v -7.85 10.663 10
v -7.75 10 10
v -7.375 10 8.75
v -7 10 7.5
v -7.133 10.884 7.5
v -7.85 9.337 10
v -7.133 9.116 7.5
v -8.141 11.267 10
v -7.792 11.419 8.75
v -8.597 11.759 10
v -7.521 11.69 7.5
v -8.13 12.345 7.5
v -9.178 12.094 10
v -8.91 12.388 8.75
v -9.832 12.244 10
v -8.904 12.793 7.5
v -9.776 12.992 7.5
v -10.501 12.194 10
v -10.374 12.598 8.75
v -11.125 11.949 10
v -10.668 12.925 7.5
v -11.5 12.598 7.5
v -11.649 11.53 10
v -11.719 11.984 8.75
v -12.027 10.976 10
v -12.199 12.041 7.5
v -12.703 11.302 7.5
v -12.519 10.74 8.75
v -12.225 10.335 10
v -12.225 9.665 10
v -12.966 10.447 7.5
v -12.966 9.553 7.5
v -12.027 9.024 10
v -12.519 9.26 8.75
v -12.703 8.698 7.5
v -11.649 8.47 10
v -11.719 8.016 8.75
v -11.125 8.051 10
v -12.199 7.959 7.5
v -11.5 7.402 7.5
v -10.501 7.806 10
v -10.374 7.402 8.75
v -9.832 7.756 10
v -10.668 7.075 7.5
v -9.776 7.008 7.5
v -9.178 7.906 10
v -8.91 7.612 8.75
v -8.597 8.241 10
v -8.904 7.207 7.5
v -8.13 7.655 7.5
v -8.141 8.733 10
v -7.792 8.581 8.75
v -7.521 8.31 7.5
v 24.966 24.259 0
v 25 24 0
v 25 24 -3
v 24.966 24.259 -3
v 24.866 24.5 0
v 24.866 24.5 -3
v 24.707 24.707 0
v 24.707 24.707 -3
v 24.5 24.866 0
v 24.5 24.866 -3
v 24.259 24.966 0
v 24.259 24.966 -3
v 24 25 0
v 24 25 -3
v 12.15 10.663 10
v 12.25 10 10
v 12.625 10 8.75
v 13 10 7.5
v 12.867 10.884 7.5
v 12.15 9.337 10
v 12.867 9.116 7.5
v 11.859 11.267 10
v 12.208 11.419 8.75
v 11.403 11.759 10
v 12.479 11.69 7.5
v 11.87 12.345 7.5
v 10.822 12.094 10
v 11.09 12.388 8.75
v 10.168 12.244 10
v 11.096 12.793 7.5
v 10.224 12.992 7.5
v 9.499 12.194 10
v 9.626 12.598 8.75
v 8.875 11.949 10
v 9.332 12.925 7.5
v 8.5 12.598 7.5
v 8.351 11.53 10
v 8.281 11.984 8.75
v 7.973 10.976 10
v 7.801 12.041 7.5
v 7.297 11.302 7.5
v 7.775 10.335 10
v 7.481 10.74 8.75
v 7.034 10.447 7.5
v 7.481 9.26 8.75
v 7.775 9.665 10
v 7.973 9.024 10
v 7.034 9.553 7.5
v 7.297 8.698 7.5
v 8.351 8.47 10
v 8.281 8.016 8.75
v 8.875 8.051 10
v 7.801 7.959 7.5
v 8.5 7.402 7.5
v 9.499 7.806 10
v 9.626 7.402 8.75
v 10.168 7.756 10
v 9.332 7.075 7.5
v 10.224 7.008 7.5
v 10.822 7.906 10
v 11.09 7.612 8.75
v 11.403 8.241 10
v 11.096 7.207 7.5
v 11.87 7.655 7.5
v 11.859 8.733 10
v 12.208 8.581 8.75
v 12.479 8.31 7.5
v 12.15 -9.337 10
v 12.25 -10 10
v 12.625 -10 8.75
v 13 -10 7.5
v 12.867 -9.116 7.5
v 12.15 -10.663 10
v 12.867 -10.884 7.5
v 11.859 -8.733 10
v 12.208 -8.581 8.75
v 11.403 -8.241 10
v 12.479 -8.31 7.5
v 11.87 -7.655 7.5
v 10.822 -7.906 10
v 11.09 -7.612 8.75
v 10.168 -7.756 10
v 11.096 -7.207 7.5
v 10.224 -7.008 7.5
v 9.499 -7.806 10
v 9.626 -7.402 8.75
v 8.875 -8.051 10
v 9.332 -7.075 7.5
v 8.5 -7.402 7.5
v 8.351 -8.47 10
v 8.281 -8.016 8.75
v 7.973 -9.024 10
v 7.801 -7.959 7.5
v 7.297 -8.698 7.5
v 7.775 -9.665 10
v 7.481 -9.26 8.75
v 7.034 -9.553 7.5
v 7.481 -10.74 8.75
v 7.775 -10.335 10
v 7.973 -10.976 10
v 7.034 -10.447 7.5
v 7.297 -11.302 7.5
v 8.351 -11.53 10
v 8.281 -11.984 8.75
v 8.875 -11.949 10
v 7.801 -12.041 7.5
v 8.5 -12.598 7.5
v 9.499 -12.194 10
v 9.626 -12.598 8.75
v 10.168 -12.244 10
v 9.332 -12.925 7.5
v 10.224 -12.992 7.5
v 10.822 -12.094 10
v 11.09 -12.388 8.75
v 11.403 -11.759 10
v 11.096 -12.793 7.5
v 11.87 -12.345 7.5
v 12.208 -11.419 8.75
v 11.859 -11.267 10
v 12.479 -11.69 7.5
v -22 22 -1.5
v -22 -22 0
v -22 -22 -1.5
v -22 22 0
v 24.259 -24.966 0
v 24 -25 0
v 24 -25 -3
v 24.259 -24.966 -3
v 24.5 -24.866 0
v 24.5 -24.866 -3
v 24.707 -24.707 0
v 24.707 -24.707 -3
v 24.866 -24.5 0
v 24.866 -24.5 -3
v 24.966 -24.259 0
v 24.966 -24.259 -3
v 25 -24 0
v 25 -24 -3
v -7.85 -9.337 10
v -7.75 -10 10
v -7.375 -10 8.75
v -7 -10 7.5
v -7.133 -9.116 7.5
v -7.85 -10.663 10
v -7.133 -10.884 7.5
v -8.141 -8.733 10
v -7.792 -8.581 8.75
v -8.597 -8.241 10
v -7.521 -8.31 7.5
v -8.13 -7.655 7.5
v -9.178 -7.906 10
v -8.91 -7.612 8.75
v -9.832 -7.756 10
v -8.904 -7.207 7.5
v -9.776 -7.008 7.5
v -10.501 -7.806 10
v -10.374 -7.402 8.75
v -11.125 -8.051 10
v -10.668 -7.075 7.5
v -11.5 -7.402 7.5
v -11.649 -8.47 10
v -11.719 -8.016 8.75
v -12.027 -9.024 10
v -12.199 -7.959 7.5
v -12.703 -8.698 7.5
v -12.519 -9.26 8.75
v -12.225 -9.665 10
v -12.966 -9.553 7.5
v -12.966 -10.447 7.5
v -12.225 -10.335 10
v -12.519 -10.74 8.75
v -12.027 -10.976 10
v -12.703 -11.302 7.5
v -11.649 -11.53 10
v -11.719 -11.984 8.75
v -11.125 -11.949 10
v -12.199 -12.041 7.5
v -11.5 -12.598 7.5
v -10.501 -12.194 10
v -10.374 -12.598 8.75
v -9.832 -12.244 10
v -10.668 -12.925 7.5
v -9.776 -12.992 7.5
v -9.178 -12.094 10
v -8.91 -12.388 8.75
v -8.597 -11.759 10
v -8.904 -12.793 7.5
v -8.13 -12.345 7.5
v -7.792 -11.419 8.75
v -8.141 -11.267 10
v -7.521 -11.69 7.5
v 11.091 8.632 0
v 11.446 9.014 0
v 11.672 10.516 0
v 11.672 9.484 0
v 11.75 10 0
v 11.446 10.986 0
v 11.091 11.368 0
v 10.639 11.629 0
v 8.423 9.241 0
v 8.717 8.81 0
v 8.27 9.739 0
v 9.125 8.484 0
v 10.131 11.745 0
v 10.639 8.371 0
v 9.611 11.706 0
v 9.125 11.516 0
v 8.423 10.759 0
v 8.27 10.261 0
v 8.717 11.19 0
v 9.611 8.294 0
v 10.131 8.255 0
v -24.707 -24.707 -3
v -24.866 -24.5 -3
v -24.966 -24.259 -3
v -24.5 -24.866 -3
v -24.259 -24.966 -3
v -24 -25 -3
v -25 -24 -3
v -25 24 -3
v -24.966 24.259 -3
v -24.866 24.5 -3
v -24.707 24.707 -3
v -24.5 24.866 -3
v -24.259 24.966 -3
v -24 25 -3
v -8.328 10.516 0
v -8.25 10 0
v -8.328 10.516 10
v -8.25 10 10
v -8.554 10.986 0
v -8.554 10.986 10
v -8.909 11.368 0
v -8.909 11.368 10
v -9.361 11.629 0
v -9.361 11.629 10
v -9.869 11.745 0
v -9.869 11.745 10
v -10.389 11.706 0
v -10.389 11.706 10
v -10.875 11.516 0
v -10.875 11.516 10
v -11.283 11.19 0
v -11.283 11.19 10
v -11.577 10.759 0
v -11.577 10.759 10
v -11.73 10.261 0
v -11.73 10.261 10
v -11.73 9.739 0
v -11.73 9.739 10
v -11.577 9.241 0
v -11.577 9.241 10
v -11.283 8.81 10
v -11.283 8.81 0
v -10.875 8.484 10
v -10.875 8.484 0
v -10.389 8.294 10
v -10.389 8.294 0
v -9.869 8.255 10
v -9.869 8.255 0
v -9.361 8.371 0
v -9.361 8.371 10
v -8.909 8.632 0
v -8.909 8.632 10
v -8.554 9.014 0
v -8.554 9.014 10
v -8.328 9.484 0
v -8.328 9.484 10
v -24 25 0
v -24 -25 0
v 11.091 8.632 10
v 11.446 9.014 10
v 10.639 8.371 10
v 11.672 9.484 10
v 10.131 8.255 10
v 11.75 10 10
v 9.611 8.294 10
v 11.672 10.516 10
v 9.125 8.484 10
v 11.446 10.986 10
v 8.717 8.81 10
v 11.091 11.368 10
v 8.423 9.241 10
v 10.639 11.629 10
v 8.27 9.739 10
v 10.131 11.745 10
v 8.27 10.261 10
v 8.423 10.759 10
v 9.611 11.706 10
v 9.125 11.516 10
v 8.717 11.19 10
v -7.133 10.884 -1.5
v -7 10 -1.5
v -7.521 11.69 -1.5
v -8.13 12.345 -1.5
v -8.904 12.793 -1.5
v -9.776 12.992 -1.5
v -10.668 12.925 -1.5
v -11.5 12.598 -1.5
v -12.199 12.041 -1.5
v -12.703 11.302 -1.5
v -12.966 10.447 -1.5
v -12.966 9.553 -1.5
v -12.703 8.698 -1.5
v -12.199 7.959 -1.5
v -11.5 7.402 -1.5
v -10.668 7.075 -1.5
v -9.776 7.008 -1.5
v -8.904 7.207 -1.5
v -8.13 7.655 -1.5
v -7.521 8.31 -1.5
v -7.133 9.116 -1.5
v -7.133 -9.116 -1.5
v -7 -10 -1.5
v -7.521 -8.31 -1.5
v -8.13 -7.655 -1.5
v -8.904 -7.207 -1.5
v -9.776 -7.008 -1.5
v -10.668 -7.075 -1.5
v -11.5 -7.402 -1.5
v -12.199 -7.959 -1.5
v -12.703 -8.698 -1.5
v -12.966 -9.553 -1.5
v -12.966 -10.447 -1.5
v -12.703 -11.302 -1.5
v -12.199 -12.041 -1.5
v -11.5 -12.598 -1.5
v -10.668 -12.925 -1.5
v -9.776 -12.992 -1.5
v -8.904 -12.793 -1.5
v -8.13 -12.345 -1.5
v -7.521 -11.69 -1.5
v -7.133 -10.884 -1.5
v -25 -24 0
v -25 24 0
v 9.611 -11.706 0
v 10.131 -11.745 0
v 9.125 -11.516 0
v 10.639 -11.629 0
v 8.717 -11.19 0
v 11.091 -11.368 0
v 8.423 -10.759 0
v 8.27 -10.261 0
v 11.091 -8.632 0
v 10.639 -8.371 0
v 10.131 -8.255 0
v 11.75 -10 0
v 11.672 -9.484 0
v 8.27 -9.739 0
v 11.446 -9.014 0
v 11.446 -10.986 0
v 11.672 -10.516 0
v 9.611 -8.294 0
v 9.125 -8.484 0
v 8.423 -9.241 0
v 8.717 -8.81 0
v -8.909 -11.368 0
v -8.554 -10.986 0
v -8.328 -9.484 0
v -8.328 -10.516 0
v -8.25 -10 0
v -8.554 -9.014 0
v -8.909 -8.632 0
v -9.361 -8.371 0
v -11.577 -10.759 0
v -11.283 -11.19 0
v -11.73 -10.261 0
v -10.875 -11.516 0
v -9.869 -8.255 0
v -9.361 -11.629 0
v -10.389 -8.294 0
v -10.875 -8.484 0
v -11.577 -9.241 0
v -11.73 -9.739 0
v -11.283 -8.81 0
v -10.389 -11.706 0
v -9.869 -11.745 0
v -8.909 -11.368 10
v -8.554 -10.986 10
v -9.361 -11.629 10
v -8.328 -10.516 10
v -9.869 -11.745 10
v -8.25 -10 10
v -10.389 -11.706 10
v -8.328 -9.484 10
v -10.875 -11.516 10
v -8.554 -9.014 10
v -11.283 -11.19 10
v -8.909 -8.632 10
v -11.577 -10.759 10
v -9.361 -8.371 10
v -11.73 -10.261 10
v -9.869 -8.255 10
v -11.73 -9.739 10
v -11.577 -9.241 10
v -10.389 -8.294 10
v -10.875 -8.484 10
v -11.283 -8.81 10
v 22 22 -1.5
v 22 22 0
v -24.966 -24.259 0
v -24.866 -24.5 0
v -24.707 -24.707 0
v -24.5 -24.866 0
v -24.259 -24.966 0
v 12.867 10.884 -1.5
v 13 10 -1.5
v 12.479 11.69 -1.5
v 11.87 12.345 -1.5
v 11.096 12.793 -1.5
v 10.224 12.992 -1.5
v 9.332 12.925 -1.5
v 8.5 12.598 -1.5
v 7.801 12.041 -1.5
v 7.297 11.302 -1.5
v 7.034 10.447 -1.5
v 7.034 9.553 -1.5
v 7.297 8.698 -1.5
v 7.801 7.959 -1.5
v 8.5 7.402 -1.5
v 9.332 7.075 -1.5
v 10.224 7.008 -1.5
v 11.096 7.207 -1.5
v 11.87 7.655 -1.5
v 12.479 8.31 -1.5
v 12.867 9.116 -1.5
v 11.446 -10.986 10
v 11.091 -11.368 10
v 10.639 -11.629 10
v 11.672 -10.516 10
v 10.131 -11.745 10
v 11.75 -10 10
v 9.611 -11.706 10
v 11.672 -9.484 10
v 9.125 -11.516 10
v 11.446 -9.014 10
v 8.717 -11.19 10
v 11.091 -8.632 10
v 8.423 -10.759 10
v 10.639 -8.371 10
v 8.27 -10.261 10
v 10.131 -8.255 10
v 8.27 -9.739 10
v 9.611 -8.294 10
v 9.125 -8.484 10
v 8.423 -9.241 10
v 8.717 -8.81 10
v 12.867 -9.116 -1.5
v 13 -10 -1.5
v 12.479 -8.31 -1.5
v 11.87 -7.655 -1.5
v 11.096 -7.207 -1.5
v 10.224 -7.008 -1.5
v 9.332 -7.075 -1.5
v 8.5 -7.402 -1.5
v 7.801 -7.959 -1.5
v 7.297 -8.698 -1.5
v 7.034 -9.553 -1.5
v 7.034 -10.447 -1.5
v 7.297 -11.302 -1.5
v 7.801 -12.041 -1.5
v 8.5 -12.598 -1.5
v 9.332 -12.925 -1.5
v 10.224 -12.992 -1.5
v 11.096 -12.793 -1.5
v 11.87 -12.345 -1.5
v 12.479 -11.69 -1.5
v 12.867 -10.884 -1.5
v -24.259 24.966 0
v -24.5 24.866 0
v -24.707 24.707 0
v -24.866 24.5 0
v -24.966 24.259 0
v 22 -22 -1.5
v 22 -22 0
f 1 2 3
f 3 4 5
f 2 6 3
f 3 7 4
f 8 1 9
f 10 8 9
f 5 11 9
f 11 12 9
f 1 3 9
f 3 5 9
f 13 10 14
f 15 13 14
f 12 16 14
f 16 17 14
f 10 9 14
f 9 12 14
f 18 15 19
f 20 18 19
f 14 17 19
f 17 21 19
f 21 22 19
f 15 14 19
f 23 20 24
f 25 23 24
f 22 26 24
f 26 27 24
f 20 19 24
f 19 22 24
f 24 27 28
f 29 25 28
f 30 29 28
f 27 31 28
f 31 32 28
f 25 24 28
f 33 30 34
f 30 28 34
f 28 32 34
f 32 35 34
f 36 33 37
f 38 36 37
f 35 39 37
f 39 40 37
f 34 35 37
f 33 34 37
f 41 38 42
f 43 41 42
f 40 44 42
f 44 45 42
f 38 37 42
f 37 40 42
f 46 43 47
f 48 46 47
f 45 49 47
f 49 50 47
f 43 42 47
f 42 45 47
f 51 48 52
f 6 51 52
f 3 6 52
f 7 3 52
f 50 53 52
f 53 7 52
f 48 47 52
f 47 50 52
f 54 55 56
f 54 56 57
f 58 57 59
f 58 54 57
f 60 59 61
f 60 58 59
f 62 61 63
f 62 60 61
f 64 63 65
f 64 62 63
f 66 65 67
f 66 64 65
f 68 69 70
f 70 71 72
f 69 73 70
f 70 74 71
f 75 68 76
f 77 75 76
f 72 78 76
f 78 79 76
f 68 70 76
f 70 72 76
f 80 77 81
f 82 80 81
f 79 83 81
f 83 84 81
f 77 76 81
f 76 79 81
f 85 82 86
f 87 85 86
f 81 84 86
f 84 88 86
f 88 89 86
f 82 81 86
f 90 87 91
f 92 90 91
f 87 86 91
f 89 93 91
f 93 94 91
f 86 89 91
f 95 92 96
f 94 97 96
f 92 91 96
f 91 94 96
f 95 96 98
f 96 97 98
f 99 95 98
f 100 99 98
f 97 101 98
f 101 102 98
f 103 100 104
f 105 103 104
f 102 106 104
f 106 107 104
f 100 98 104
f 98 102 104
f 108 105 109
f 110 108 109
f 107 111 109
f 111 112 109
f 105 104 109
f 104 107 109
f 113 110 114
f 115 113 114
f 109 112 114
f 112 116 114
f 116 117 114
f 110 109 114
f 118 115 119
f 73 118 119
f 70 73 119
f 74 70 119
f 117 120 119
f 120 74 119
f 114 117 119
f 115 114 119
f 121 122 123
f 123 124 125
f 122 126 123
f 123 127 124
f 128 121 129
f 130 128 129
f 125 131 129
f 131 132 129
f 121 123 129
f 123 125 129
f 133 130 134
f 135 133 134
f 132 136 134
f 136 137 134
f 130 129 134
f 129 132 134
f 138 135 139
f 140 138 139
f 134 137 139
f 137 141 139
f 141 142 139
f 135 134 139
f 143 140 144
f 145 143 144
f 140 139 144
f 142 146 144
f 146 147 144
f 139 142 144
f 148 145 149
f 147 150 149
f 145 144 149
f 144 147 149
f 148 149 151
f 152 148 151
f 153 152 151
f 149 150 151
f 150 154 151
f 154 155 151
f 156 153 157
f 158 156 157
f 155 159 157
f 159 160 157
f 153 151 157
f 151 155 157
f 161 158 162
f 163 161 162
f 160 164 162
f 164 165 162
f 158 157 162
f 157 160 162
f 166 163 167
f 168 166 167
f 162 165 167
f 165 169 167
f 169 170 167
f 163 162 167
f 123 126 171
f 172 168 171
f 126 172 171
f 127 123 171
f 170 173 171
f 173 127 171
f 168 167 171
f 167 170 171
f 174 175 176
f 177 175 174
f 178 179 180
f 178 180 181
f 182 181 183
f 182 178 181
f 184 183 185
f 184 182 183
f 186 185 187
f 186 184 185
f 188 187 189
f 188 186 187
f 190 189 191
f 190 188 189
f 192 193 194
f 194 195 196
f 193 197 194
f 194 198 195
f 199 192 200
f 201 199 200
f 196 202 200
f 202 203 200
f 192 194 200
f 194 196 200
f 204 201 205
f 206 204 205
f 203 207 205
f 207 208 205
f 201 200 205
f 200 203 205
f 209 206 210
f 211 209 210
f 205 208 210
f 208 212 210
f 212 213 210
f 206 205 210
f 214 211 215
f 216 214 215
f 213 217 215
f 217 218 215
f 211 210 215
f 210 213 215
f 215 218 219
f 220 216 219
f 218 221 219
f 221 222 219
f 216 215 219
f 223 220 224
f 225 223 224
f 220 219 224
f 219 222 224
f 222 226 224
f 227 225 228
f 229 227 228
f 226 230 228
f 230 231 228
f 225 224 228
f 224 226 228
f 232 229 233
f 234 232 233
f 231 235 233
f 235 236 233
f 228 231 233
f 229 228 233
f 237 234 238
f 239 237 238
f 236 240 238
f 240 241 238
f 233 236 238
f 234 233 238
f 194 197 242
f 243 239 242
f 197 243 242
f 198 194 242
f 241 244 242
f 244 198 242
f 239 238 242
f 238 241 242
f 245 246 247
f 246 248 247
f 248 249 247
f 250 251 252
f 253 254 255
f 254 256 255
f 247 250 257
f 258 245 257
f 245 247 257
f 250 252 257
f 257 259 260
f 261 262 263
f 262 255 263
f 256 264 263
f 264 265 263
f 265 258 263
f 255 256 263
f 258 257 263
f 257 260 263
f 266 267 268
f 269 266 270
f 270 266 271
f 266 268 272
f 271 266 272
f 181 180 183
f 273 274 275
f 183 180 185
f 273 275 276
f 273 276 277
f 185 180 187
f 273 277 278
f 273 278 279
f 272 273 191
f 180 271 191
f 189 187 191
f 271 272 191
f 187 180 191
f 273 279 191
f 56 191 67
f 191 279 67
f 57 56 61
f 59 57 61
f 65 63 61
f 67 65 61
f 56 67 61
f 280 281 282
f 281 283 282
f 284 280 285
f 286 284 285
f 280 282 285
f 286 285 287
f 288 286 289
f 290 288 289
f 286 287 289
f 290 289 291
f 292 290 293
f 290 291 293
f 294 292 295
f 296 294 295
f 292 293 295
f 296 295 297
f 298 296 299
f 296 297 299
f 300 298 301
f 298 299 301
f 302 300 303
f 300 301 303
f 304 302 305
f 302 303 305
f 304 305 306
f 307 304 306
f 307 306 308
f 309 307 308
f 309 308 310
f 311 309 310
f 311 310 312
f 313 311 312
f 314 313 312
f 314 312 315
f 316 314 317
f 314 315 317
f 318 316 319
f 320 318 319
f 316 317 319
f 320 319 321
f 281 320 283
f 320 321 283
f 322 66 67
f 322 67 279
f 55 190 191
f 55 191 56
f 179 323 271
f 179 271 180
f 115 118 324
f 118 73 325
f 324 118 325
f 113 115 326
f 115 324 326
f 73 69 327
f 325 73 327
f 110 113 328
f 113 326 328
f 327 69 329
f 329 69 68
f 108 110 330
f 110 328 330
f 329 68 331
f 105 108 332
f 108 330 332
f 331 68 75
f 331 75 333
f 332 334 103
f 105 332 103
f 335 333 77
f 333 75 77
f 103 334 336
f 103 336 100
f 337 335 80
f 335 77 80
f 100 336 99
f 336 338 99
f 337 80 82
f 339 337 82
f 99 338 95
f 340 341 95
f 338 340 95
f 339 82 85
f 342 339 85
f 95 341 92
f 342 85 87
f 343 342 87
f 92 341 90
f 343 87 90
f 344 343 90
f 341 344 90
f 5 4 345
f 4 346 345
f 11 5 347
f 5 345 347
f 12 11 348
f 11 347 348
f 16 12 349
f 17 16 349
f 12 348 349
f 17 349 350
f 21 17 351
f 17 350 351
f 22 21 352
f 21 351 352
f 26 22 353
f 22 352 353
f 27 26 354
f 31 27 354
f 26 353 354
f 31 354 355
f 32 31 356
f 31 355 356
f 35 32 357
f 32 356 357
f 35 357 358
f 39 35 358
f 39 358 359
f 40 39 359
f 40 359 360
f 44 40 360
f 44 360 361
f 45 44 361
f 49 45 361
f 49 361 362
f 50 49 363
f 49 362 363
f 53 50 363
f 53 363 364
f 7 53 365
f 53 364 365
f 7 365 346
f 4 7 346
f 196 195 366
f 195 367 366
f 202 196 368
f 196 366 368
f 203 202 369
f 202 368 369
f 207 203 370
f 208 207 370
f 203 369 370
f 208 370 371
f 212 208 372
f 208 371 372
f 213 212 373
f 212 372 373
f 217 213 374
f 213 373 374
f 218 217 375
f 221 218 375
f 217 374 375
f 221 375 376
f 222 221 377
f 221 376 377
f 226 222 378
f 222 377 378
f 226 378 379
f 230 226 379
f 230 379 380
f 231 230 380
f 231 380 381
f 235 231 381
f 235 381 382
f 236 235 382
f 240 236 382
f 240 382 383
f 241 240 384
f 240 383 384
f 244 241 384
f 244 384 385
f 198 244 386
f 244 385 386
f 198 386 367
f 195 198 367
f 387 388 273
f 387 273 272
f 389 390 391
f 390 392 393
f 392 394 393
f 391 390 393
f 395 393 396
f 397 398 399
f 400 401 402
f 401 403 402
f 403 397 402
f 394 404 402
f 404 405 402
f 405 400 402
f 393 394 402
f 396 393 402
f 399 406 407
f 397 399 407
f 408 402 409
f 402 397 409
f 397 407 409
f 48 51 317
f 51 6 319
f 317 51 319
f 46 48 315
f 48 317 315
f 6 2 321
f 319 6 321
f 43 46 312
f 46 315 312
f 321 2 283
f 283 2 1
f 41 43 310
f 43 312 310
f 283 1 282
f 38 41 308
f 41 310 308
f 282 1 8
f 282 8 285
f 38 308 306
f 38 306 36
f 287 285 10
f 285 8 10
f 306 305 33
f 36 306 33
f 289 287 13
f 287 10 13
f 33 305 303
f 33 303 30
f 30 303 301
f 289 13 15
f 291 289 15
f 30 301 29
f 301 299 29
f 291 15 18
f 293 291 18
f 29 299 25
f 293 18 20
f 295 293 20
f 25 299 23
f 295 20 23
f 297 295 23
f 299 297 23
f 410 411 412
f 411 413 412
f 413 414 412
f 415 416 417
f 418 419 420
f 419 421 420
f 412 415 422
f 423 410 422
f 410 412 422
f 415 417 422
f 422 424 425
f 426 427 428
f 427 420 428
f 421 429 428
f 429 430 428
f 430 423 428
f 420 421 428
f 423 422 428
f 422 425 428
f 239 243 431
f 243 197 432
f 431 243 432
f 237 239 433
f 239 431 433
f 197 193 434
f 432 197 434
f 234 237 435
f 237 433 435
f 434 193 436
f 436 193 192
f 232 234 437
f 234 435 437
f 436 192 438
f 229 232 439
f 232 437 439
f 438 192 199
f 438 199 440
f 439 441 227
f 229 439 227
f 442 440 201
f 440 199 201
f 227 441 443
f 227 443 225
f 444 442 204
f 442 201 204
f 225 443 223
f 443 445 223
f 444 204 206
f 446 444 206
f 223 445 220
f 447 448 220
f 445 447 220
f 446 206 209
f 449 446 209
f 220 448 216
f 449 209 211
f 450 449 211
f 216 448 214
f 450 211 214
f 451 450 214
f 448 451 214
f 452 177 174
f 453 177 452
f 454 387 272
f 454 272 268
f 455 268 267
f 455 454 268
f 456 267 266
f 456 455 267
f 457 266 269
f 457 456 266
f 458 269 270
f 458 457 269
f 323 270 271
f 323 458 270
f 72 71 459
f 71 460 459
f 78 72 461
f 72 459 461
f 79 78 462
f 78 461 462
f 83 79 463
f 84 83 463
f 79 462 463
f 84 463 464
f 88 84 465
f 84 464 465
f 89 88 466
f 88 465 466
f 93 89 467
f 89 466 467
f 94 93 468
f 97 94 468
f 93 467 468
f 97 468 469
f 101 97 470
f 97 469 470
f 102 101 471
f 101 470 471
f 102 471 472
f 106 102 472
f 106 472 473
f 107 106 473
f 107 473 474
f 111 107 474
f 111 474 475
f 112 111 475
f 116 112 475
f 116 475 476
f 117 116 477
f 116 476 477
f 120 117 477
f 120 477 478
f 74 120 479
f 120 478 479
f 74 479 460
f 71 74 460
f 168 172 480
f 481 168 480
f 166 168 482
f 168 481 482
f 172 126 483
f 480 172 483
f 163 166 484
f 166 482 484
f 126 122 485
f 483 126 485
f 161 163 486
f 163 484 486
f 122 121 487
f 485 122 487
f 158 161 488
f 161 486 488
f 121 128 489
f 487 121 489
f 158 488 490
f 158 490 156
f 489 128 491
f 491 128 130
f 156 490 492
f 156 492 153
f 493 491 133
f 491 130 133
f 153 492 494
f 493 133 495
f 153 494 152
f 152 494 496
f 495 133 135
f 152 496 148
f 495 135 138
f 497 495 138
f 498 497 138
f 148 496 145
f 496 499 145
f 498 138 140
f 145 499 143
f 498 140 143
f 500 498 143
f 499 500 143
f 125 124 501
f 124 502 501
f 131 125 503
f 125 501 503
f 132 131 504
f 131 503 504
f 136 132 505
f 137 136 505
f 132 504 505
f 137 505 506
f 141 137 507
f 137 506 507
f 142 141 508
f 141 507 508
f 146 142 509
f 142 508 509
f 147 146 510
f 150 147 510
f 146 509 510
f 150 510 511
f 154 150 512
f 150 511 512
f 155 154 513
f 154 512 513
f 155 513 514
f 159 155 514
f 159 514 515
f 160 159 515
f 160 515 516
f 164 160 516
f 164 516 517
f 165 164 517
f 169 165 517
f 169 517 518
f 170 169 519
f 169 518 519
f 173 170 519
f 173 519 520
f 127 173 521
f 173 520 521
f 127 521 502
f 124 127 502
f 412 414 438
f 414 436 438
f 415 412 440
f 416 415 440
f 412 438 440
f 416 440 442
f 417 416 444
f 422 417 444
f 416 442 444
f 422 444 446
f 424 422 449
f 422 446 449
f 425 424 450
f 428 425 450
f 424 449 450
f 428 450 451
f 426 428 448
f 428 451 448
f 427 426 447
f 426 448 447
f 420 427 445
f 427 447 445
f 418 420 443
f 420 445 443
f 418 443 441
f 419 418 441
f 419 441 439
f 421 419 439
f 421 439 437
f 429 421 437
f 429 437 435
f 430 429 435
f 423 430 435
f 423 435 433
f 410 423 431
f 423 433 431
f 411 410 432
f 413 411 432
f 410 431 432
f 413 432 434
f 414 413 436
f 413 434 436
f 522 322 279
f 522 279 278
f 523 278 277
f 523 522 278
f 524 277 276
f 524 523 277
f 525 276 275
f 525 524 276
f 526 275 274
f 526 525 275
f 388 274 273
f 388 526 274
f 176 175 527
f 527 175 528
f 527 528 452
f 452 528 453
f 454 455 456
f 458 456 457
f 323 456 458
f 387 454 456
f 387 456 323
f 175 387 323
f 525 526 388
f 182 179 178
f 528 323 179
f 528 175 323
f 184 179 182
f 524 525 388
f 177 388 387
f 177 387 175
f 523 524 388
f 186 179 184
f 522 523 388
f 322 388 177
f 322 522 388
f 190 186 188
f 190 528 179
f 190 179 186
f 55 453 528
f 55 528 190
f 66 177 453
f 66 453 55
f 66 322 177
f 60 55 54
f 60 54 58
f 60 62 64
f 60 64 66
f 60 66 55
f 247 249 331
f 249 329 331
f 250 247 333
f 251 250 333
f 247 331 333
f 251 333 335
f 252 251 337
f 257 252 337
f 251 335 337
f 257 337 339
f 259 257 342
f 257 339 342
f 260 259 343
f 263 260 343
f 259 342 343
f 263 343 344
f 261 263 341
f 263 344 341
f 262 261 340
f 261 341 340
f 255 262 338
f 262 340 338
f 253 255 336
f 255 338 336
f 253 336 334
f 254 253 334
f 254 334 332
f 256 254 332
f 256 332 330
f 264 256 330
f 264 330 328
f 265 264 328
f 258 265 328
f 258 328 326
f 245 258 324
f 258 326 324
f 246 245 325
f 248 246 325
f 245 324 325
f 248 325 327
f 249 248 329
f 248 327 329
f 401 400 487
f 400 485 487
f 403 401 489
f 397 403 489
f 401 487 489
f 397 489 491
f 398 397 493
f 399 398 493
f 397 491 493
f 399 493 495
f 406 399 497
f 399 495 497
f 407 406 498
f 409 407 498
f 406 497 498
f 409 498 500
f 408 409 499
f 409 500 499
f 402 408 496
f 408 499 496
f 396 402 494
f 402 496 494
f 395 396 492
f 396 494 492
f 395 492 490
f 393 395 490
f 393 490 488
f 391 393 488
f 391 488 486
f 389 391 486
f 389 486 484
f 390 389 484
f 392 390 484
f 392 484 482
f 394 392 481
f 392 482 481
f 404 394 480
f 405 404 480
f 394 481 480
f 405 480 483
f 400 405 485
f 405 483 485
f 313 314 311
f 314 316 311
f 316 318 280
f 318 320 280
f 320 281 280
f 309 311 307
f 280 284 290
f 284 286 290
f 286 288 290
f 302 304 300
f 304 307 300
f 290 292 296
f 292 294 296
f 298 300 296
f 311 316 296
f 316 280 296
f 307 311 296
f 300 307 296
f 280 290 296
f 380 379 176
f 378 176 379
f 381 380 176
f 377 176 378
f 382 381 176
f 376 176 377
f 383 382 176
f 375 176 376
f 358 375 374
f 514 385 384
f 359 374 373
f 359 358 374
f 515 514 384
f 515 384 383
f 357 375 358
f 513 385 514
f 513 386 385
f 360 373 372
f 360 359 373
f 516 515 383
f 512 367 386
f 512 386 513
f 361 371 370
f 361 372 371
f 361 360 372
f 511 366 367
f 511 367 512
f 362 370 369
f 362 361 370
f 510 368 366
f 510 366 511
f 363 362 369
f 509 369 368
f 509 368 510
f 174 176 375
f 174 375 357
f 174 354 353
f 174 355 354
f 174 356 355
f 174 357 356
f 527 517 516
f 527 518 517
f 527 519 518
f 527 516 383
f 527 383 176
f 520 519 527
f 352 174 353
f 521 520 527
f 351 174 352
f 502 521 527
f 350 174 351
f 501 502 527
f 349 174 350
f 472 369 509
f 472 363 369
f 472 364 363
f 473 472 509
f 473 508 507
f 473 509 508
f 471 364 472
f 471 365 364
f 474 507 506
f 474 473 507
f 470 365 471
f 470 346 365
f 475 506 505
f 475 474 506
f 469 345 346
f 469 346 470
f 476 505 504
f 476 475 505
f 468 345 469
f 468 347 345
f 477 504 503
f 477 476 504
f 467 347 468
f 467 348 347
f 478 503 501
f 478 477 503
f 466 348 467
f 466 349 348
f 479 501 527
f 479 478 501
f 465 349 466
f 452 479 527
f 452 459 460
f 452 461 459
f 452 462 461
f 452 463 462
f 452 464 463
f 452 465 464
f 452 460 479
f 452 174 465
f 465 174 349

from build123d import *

# Parameters (mm, degrees)
BOSS_EXTRUDE1_DEPTH = 3
SKETCH2_W           = 44
SKETCH2_H           = 44
CUT_EXTRUDE1_DEPTH  = 1.5


with BuildPart() as part:
    # Sketch1 → Boss-Extrude1 (new body)
    with BuildSketch(Plane.XY):
        with BuildLine():
            Line((-25, 24), (-25, -24))
            ThreePointArc((-25, -24), (-24.707106781, -24.707106781), (-24, -25))
            Line((-24, -25), (24, -25))
            ThreePointArc((24, -25), (24.707106781, -24.707106781), (25, -24))
            Line((25, -24), (25, 24))
            ThreePointArc((25, 24), (24.707106781, 24.707106781), (24, 25))
            Line((24, 25), (-24, 25))
            ThreePointArc((-24, 25), (-24.707106781, 24.707106781), (-25, 24))
        make_face()
    extrude(amount=-BOSS_EXTRUDE1_DEPTH)

    # Sketch2 → Cut-Extrude1 (cut)
    with BuildSketch(Plane.XY):
        Rectangle(SKETCH2_W, SKETCH2_H)
    extrude(amount=-CUT_EXTRUDE1_DEPTH, mode=Mode.SUBTRACT)

    # Sketch3 → Revolve1 (revolve)
    with BuildSketch(Plane(origin=(-10, 0, 0), x_dir=(0, 0, -1), z_dir=(1, 0, 0)), mode=Mode.PRIVATE) as revolve1_sk:
        Polygon((0, 10), (0, 11.75), (-10, 11.75), (-10, 12.25), (-7.5, 13), (1.5, 13), (1.5, 10), align=None)
    revolve(revolve1_sk.sketch.rotate(Axis((-10, 10, -1.5), (0, 0, 1)), 270), axis=Axis((-10, 10, -1.5), (0, 0, 1)))

    # Sketch4 → Revolve2 (revolve)
    with BuildSketch(Plane(origin=(10, 0, 0), x_dir=(0, 0, -1), z_dir=(1, 0, 0)), mode=Mode.PRIVATE) as revolve2_sk:
        Polygon((0, 10), (0, 11.75), (-10, 11.75), (-10, 12.25), (-7.5, 13), (1.5, 13), (1.5, 10), align=None)
    revolve(revolve2_sk.sketch.rotate(Axis((10, 10, -1.5), (0, 0, 1)), 270), axis=Axis((10, 10, -1.5), (0, 0, 1)))

    # Sketch5 → Revolve3 (revolve)
    with BuildSketch(Plane(origin=(10, 0, 0), x_dir=(0, 0, -1), z_dir=(1, 0, 0)), mode=Mode.PRIVATE) as revolve3_sk:
        Polygon((0, -10), (0, -8.25), (-10, -8.25), (-10, -7.75), (-7.5, -7), (1.5, -7), (1.5, -10), align=None)
    revolve(revolve3_sk.sketch.rotate(Axis((10, -10, -1.5), (0, 0, 1)), 270), axis=Axis((10, -10, -1.5), (0, 0, 1)))

    # Sketch6 → Revolve4 (revolve)
    with BuildSketch(Plane(origin=(-10, 0, 0), x_dir=(0, 0, -1), z_dir=(1, 0, 0)), mode=Mode.PRIVATE) as revolve4_sk:
        Polygon((0, -10), (0, -8.25), (-10, -8.25), (-10, -7.75), (-7.5, -7), (1.5, -7), (1.5, -10), align=None)
    revolve(revolve4_sk.sketch.rotate(Axis((-10, -10, -1.5), (0, 0, 1)), 270), axis=Axis((-10, -10, -1.5), (0, 0, 1)))


solid = part.part
